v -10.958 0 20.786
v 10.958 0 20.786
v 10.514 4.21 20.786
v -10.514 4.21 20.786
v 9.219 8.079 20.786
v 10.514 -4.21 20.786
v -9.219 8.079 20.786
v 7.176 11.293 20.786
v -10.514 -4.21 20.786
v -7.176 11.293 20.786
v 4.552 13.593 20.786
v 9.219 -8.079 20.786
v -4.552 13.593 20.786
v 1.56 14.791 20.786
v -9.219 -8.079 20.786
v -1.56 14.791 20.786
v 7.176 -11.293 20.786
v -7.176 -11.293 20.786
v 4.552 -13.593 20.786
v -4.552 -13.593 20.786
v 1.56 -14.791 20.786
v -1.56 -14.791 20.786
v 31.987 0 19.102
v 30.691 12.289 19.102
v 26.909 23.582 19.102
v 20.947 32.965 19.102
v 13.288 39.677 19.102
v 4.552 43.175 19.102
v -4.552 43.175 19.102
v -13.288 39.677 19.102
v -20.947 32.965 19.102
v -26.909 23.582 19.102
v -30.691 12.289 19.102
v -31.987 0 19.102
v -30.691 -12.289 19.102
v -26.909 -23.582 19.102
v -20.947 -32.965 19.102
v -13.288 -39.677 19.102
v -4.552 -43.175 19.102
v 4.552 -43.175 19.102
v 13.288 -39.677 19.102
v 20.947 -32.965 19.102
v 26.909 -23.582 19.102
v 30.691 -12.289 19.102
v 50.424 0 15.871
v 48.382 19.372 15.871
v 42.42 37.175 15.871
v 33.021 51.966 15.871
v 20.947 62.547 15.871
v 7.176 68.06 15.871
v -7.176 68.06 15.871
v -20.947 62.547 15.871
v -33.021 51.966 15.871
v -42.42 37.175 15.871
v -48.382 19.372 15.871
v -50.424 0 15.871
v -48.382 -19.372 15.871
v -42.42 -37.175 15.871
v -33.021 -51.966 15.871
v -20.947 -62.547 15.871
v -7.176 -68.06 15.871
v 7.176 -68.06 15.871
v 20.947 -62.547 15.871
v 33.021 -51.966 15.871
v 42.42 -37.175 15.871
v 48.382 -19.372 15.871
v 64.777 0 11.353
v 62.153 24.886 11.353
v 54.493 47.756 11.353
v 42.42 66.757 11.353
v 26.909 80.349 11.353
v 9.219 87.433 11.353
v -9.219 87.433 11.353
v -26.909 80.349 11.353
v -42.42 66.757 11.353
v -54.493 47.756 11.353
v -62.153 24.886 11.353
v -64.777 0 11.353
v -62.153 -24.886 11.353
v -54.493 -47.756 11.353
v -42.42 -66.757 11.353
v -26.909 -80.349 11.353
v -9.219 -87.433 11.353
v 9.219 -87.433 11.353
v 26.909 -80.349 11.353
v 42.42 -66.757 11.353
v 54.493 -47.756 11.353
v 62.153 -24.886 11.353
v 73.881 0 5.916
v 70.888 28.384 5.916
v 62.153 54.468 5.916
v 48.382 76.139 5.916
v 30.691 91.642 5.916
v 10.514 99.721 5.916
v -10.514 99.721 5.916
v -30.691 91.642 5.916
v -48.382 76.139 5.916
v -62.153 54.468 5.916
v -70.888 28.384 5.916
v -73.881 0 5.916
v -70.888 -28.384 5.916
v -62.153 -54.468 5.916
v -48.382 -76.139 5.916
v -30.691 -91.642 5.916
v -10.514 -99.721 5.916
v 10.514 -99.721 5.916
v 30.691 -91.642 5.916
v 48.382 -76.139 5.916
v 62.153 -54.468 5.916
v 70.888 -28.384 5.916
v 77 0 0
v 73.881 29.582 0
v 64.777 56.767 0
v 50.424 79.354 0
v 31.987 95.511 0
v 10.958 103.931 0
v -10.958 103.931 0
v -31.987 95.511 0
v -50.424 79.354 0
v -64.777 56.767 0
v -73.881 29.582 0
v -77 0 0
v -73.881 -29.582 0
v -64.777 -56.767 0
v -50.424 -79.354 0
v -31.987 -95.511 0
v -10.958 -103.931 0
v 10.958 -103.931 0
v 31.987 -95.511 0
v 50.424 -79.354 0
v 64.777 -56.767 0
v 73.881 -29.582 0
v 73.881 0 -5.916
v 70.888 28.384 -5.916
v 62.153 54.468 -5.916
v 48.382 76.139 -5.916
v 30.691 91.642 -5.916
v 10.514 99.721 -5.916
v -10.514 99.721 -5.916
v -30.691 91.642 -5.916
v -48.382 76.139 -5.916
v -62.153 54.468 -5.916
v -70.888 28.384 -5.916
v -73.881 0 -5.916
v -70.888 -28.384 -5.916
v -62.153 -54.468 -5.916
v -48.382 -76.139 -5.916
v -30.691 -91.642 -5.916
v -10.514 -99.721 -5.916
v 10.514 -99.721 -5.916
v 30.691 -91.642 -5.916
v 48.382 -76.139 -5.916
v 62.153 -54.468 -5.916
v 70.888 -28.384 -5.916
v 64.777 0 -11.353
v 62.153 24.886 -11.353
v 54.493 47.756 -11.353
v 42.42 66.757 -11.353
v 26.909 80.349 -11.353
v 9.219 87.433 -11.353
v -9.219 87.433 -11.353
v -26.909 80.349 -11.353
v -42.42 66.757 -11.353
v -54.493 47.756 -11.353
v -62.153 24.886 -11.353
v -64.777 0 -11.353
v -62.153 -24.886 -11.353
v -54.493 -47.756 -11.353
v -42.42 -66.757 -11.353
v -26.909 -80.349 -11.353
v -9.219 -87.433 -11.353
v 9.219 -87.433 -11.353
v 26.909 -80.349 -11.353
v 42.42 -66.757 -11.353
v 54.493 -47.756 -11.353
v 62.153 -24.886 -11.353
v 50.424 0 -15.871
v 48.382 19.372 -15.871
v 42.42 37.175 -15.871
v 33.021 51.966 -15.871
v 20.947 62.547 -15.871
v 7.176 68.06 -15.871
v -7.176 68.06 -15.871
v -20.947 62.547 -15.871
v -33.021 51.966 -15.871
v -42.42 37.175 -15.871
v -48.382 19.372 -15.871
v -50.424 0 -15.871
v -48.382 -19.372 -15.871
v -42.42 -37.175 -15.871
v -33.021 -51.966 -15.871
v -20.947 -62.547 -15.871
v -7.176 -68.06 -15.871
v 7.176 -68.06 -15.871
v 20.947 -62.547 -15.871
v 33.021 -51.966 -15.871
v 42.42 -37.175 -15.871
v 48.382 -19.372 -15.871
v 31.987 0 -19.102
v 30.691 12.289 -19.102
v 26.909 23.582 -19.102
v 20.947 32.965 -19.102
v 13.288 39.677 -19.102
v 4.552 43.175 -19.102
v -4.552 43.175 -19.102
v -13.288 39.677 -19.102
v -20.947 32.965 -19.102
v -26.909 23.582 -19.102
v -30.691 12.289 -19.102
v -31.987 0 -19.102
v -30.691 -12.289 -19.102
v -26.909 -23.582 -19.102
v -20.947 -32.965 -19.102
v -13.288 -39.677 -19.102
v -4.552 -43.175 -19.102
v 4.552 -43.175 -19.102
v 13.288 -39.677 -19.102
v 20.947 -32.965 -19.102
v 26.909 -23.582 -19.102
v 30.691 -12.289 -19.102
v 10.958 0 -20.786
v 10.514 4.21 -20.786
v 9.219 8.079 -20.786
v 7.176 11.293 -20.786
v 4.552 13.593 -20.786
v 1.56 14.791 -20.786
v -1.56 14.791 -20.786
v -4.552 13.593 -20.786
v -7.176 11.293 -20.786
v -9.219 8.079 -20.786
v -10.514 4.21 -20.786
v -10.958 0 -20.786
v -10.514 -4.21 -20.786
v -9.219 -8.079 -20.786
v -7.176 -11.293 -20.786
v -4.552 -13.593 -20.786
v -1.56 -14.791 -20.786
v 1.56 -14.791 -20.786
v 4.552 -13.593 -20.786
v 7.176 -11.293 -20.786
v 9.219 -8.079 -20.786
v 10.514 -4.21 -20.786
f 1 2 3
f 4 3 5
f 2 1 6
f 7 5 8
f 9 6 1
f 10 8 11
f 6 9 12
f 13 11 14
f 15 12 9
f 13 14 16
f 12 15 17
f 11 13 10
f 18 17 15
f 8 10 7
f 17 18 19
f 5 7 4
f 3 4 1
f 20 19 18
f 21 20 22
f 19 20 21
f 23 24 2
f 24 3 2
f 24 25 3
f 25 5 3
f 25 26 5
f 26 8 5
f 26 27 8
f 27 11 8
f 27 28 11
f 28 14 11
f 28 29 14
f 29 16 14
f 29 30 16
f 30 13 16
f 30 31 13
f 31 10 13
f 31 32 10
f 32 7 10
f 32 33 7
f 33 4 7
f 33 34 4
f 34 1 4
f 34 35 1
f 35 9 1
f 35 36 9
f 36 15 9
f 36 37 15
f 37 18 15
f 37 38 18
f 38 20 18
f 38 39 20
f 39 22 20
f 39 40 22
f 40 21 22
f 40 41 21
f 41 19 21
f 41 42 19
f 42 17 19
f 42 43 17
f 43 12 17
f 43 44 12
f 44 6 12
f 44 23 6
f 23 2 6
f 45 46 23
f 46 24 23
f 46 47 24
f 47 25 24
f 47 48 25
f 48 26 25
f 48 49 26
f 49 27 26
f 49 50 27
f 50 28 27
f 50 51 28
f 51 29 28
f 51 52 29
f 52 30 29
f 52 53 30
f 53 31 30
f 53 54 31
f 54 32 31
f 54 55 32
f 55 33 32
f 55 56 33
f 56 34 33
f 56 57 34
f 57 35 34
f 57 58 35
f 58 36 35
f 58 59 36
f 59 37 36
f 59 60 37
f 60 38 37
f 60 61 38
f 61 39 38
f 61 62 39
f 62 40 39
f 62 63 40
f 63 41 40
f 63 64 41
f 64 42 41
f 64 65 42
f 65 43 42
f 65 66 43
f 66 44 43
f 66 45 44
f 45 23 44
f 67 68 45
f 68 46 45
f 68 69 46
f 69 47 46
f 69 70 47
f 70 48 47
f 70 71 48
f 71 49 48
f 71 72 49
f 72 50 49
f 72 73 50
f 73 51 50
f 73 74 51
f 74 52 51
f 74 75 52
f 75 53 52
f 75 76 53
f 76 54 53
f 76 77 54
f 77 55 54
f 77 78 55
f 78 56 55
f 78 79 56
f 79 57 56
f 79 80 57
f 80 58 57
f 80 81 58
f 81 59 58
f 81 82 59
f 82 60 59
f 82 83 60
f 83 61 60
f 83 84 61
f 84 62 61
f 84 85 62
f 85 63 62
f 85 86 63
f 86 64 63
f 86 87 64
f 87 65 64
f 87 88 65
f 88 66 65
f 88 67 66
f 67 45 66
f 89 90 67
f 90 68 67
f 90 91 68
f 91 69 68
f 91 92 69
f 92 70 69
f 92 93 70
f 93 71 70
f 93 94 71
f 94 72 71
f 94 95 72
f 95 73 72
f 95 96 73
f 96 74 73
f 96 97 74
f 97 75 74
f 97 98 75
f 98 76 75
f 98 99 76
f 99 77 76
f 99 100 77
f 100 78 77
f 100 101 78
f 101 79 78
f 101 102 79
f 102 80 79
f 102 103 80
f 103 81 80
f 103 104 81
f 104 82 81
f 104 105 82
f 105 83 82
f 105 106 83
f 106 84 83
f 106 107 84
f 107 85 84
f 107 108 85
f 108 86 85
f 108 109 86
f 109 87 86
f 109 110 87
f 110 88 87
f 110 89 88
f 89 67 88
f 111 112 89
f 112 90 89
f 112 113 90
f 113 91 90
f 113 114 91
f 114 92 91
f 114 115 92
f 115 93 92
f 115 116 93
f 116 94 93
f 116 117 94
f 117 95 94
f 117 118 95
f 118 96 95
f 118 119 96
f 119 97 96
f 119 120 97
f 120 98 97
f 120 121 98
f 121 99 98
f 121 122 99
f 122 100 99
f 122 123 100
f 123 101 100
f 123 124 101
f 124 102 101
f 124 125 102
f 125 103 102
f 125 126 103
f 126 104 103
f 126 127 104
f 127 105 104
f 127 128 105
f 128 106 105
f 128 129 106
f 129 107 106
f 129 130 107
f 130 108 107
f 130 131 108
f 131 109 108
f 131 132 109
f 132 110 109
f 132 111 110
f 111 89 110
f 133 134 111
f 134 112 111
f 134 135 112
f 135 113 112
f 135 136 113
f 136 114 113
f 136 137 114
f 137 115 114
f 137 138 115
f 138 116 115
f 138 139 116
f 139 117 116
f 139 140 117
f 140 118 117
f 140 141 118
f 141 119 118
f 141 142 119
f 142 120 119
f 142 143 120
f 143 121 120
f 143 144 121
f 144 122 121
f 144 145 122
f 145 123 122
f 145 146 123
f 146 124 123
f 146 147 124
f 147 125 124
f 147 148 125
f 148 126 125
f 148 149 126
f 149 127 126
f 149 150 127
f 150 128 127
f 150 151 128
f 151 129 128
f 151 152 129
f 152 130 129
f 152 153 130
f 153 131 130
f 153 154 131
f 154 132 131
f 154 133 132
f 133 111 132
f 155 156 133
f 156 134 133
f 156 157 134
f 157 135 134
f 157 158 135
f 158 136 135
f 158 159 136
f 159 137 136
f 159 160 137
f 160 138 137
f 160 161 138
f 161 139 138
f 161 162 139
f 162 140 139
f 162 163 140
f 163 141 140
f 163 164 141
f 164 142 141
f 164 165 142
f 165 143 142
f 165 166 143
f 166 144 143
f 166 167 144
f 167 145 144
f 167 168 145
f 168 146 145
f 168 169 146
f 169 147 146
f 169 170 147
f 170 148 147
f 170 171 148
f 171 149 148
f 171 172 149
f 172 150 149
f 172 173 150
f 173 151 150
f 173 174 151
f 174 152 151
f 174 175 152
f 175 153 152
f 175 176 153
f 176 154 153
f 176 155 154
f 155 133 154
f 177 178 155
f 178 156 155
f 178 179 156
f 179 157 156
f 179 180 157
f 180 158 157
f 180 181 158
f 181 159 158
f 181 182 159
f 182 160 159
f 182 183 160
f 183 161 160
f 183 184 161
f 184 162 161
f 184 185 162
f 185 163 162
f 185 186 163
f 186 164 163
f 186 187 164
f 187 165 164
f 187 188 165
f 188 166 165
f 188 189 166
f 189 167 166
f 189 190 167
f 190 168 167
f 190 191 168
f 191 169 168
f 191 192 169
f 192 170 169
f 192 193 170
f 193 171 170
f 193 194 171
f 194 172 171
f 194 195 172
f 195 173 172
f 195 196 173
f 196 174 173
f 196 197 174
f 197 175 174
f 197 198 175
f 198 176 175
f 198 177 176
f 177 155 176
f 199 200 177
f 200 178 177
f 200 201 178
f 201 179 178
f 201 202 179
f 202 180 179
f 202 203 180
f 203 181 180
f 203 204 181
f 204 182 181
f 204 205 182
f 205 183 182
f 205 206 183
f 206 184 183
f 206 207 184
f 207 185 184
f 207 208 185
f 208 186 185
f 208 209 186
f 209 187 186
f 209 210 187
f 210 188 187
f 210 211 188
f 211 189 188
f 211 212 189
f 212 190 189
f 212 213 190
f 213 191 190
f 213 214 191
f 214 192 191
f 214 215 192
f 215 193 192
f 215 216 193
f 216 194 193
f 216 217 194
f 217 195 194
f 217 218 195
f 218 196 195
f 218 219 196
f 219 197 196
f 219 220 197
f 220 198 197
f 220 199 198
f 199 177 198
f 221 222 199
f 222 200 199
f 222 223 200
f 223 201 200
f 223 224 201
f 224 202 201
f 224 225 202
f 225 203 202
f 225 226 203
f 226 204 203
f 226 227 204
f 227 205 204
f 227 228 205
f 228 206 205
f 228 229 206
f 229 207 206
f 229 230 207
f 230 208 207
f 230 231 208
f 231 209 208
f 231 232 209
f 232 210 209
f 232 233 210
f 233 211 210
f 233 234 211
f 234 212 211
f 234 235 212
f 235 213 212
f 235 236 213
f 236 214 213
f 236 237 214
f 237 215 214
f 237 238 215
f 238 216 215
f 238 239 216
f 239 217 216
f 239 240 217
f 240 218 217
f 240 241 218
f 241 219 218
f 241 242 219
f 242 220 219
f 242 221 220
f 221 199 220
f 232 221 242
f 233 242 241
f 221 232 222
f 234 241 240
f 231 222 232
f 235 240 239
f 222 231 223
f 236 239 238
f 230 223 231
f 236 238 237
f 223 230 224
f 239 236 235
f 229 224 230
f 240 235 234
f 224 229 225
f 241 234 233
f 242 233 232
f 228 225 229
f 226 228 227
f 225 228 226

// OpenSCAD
// Generated by SolidPython 1.0.1 on 2020-07-29 00:46:50


scale(v = [11, 15, 3]) {
	sphere(r = 7);
}
/***********************************************
*********      SolidPython code:      **********
************************************************
 
# import packages: SolidPython
from solid import *
from solid.utils import *
from itertools import chain, combinations, permutations


class Resize:

    def __init__(self, scad_file):
        self.scad_file = scad_file
        #self.scad_file = import_scad(scad_file)
        # cone/cylinder param:
        self.r1 = 0
        self.r2 = 0
        self.h = 0
        # rectangular prism param:
        self.w = 0
        self.l = 0
        # ellipse param:
        self.r = 0

    # import OpenScad code (file name corresponds to shape)


    # classify shape + parameters
    def assign(self, param1, param2, param3):
        if self.scad_file == 'cone.scad':
            self.r1 = param1
            self.r2 = param2
            self.h = param3
        elif self.scad_file == 'cylinder.scad':
            self.r1 = param1
            self.r2 = param2
            self.h = param3
        elif self.scad_file == 'rectangularPrism.scad':
            self.h = param1
            self.l = param2
            self.w = param3
        else:
            self.r = param1
            self.h = param2

    # resize parameters
    def iterate(self):
        x = range(3, 20, 2)
        i = 1
        if self.scad_file == 'cone.scad':
            tempList = list(permutations(x, 2))
            for temp in tempList:
                param1 = temp[0]
                param2 = temp[1]
                filepath = 'produced_scad_files/' + 'cone' + str(param1) + '_' + str(param2) + '_' + '.scad'
                scad_render_to_file(cylinder(h=param1, r1=param2, r2=0), filepath)

        elif self.scad_file == 'cylinder.scad':
            tempList = list(permutations(x, 3))
            for temp in tempList:
                param1 = temp[0]
                param2 = temp[1]
                filepath = 'produced_scad_files/' + 'cylinder' + str(param1) + '_' + str(param2) + '_' + '.scad'
                scad_render_to_file(cylinder(h=param1, r1=param2, r2=param2), filepath)

        elif self.scad_file == 'rectangularPrism.scad':
            tempList = list(permutations(x, 3))
            for temp in tempList:
                param1 = temp[0]
                param2 = temp[1]
                param3 = temp[2]
                filepath = 'produced_scad_files/' + 'rectangularPrism' + str(param1) + '_' + str(param2) + '_' + str(
                    param3) + '.scad'
                scad_render_to_file(cube(size=(param1, param2, param3)), filepath)

        elif self.scad_file == 'ellipse.scad':
            tempList = list(permutations(x, 4))
            for temp in tempList:
                param1 = temp[0]
                param2 = temp[1]
                param3 = temp[2]
                param4 = temp[3]
                filepath = 'produced_scad_files/' + 'ellipse' + str(param1) + '_' + str(param2) + '_' + str(param3) + '_' + str(param4) + '.scad'
                scad_render_to_file(scale([param1, param2, param3])(sphere(r=param4)), filepath)

    def render_to_scadfile(self):
        scad_render_to_file(scad, 'example.scad') 
 
************************************************/
